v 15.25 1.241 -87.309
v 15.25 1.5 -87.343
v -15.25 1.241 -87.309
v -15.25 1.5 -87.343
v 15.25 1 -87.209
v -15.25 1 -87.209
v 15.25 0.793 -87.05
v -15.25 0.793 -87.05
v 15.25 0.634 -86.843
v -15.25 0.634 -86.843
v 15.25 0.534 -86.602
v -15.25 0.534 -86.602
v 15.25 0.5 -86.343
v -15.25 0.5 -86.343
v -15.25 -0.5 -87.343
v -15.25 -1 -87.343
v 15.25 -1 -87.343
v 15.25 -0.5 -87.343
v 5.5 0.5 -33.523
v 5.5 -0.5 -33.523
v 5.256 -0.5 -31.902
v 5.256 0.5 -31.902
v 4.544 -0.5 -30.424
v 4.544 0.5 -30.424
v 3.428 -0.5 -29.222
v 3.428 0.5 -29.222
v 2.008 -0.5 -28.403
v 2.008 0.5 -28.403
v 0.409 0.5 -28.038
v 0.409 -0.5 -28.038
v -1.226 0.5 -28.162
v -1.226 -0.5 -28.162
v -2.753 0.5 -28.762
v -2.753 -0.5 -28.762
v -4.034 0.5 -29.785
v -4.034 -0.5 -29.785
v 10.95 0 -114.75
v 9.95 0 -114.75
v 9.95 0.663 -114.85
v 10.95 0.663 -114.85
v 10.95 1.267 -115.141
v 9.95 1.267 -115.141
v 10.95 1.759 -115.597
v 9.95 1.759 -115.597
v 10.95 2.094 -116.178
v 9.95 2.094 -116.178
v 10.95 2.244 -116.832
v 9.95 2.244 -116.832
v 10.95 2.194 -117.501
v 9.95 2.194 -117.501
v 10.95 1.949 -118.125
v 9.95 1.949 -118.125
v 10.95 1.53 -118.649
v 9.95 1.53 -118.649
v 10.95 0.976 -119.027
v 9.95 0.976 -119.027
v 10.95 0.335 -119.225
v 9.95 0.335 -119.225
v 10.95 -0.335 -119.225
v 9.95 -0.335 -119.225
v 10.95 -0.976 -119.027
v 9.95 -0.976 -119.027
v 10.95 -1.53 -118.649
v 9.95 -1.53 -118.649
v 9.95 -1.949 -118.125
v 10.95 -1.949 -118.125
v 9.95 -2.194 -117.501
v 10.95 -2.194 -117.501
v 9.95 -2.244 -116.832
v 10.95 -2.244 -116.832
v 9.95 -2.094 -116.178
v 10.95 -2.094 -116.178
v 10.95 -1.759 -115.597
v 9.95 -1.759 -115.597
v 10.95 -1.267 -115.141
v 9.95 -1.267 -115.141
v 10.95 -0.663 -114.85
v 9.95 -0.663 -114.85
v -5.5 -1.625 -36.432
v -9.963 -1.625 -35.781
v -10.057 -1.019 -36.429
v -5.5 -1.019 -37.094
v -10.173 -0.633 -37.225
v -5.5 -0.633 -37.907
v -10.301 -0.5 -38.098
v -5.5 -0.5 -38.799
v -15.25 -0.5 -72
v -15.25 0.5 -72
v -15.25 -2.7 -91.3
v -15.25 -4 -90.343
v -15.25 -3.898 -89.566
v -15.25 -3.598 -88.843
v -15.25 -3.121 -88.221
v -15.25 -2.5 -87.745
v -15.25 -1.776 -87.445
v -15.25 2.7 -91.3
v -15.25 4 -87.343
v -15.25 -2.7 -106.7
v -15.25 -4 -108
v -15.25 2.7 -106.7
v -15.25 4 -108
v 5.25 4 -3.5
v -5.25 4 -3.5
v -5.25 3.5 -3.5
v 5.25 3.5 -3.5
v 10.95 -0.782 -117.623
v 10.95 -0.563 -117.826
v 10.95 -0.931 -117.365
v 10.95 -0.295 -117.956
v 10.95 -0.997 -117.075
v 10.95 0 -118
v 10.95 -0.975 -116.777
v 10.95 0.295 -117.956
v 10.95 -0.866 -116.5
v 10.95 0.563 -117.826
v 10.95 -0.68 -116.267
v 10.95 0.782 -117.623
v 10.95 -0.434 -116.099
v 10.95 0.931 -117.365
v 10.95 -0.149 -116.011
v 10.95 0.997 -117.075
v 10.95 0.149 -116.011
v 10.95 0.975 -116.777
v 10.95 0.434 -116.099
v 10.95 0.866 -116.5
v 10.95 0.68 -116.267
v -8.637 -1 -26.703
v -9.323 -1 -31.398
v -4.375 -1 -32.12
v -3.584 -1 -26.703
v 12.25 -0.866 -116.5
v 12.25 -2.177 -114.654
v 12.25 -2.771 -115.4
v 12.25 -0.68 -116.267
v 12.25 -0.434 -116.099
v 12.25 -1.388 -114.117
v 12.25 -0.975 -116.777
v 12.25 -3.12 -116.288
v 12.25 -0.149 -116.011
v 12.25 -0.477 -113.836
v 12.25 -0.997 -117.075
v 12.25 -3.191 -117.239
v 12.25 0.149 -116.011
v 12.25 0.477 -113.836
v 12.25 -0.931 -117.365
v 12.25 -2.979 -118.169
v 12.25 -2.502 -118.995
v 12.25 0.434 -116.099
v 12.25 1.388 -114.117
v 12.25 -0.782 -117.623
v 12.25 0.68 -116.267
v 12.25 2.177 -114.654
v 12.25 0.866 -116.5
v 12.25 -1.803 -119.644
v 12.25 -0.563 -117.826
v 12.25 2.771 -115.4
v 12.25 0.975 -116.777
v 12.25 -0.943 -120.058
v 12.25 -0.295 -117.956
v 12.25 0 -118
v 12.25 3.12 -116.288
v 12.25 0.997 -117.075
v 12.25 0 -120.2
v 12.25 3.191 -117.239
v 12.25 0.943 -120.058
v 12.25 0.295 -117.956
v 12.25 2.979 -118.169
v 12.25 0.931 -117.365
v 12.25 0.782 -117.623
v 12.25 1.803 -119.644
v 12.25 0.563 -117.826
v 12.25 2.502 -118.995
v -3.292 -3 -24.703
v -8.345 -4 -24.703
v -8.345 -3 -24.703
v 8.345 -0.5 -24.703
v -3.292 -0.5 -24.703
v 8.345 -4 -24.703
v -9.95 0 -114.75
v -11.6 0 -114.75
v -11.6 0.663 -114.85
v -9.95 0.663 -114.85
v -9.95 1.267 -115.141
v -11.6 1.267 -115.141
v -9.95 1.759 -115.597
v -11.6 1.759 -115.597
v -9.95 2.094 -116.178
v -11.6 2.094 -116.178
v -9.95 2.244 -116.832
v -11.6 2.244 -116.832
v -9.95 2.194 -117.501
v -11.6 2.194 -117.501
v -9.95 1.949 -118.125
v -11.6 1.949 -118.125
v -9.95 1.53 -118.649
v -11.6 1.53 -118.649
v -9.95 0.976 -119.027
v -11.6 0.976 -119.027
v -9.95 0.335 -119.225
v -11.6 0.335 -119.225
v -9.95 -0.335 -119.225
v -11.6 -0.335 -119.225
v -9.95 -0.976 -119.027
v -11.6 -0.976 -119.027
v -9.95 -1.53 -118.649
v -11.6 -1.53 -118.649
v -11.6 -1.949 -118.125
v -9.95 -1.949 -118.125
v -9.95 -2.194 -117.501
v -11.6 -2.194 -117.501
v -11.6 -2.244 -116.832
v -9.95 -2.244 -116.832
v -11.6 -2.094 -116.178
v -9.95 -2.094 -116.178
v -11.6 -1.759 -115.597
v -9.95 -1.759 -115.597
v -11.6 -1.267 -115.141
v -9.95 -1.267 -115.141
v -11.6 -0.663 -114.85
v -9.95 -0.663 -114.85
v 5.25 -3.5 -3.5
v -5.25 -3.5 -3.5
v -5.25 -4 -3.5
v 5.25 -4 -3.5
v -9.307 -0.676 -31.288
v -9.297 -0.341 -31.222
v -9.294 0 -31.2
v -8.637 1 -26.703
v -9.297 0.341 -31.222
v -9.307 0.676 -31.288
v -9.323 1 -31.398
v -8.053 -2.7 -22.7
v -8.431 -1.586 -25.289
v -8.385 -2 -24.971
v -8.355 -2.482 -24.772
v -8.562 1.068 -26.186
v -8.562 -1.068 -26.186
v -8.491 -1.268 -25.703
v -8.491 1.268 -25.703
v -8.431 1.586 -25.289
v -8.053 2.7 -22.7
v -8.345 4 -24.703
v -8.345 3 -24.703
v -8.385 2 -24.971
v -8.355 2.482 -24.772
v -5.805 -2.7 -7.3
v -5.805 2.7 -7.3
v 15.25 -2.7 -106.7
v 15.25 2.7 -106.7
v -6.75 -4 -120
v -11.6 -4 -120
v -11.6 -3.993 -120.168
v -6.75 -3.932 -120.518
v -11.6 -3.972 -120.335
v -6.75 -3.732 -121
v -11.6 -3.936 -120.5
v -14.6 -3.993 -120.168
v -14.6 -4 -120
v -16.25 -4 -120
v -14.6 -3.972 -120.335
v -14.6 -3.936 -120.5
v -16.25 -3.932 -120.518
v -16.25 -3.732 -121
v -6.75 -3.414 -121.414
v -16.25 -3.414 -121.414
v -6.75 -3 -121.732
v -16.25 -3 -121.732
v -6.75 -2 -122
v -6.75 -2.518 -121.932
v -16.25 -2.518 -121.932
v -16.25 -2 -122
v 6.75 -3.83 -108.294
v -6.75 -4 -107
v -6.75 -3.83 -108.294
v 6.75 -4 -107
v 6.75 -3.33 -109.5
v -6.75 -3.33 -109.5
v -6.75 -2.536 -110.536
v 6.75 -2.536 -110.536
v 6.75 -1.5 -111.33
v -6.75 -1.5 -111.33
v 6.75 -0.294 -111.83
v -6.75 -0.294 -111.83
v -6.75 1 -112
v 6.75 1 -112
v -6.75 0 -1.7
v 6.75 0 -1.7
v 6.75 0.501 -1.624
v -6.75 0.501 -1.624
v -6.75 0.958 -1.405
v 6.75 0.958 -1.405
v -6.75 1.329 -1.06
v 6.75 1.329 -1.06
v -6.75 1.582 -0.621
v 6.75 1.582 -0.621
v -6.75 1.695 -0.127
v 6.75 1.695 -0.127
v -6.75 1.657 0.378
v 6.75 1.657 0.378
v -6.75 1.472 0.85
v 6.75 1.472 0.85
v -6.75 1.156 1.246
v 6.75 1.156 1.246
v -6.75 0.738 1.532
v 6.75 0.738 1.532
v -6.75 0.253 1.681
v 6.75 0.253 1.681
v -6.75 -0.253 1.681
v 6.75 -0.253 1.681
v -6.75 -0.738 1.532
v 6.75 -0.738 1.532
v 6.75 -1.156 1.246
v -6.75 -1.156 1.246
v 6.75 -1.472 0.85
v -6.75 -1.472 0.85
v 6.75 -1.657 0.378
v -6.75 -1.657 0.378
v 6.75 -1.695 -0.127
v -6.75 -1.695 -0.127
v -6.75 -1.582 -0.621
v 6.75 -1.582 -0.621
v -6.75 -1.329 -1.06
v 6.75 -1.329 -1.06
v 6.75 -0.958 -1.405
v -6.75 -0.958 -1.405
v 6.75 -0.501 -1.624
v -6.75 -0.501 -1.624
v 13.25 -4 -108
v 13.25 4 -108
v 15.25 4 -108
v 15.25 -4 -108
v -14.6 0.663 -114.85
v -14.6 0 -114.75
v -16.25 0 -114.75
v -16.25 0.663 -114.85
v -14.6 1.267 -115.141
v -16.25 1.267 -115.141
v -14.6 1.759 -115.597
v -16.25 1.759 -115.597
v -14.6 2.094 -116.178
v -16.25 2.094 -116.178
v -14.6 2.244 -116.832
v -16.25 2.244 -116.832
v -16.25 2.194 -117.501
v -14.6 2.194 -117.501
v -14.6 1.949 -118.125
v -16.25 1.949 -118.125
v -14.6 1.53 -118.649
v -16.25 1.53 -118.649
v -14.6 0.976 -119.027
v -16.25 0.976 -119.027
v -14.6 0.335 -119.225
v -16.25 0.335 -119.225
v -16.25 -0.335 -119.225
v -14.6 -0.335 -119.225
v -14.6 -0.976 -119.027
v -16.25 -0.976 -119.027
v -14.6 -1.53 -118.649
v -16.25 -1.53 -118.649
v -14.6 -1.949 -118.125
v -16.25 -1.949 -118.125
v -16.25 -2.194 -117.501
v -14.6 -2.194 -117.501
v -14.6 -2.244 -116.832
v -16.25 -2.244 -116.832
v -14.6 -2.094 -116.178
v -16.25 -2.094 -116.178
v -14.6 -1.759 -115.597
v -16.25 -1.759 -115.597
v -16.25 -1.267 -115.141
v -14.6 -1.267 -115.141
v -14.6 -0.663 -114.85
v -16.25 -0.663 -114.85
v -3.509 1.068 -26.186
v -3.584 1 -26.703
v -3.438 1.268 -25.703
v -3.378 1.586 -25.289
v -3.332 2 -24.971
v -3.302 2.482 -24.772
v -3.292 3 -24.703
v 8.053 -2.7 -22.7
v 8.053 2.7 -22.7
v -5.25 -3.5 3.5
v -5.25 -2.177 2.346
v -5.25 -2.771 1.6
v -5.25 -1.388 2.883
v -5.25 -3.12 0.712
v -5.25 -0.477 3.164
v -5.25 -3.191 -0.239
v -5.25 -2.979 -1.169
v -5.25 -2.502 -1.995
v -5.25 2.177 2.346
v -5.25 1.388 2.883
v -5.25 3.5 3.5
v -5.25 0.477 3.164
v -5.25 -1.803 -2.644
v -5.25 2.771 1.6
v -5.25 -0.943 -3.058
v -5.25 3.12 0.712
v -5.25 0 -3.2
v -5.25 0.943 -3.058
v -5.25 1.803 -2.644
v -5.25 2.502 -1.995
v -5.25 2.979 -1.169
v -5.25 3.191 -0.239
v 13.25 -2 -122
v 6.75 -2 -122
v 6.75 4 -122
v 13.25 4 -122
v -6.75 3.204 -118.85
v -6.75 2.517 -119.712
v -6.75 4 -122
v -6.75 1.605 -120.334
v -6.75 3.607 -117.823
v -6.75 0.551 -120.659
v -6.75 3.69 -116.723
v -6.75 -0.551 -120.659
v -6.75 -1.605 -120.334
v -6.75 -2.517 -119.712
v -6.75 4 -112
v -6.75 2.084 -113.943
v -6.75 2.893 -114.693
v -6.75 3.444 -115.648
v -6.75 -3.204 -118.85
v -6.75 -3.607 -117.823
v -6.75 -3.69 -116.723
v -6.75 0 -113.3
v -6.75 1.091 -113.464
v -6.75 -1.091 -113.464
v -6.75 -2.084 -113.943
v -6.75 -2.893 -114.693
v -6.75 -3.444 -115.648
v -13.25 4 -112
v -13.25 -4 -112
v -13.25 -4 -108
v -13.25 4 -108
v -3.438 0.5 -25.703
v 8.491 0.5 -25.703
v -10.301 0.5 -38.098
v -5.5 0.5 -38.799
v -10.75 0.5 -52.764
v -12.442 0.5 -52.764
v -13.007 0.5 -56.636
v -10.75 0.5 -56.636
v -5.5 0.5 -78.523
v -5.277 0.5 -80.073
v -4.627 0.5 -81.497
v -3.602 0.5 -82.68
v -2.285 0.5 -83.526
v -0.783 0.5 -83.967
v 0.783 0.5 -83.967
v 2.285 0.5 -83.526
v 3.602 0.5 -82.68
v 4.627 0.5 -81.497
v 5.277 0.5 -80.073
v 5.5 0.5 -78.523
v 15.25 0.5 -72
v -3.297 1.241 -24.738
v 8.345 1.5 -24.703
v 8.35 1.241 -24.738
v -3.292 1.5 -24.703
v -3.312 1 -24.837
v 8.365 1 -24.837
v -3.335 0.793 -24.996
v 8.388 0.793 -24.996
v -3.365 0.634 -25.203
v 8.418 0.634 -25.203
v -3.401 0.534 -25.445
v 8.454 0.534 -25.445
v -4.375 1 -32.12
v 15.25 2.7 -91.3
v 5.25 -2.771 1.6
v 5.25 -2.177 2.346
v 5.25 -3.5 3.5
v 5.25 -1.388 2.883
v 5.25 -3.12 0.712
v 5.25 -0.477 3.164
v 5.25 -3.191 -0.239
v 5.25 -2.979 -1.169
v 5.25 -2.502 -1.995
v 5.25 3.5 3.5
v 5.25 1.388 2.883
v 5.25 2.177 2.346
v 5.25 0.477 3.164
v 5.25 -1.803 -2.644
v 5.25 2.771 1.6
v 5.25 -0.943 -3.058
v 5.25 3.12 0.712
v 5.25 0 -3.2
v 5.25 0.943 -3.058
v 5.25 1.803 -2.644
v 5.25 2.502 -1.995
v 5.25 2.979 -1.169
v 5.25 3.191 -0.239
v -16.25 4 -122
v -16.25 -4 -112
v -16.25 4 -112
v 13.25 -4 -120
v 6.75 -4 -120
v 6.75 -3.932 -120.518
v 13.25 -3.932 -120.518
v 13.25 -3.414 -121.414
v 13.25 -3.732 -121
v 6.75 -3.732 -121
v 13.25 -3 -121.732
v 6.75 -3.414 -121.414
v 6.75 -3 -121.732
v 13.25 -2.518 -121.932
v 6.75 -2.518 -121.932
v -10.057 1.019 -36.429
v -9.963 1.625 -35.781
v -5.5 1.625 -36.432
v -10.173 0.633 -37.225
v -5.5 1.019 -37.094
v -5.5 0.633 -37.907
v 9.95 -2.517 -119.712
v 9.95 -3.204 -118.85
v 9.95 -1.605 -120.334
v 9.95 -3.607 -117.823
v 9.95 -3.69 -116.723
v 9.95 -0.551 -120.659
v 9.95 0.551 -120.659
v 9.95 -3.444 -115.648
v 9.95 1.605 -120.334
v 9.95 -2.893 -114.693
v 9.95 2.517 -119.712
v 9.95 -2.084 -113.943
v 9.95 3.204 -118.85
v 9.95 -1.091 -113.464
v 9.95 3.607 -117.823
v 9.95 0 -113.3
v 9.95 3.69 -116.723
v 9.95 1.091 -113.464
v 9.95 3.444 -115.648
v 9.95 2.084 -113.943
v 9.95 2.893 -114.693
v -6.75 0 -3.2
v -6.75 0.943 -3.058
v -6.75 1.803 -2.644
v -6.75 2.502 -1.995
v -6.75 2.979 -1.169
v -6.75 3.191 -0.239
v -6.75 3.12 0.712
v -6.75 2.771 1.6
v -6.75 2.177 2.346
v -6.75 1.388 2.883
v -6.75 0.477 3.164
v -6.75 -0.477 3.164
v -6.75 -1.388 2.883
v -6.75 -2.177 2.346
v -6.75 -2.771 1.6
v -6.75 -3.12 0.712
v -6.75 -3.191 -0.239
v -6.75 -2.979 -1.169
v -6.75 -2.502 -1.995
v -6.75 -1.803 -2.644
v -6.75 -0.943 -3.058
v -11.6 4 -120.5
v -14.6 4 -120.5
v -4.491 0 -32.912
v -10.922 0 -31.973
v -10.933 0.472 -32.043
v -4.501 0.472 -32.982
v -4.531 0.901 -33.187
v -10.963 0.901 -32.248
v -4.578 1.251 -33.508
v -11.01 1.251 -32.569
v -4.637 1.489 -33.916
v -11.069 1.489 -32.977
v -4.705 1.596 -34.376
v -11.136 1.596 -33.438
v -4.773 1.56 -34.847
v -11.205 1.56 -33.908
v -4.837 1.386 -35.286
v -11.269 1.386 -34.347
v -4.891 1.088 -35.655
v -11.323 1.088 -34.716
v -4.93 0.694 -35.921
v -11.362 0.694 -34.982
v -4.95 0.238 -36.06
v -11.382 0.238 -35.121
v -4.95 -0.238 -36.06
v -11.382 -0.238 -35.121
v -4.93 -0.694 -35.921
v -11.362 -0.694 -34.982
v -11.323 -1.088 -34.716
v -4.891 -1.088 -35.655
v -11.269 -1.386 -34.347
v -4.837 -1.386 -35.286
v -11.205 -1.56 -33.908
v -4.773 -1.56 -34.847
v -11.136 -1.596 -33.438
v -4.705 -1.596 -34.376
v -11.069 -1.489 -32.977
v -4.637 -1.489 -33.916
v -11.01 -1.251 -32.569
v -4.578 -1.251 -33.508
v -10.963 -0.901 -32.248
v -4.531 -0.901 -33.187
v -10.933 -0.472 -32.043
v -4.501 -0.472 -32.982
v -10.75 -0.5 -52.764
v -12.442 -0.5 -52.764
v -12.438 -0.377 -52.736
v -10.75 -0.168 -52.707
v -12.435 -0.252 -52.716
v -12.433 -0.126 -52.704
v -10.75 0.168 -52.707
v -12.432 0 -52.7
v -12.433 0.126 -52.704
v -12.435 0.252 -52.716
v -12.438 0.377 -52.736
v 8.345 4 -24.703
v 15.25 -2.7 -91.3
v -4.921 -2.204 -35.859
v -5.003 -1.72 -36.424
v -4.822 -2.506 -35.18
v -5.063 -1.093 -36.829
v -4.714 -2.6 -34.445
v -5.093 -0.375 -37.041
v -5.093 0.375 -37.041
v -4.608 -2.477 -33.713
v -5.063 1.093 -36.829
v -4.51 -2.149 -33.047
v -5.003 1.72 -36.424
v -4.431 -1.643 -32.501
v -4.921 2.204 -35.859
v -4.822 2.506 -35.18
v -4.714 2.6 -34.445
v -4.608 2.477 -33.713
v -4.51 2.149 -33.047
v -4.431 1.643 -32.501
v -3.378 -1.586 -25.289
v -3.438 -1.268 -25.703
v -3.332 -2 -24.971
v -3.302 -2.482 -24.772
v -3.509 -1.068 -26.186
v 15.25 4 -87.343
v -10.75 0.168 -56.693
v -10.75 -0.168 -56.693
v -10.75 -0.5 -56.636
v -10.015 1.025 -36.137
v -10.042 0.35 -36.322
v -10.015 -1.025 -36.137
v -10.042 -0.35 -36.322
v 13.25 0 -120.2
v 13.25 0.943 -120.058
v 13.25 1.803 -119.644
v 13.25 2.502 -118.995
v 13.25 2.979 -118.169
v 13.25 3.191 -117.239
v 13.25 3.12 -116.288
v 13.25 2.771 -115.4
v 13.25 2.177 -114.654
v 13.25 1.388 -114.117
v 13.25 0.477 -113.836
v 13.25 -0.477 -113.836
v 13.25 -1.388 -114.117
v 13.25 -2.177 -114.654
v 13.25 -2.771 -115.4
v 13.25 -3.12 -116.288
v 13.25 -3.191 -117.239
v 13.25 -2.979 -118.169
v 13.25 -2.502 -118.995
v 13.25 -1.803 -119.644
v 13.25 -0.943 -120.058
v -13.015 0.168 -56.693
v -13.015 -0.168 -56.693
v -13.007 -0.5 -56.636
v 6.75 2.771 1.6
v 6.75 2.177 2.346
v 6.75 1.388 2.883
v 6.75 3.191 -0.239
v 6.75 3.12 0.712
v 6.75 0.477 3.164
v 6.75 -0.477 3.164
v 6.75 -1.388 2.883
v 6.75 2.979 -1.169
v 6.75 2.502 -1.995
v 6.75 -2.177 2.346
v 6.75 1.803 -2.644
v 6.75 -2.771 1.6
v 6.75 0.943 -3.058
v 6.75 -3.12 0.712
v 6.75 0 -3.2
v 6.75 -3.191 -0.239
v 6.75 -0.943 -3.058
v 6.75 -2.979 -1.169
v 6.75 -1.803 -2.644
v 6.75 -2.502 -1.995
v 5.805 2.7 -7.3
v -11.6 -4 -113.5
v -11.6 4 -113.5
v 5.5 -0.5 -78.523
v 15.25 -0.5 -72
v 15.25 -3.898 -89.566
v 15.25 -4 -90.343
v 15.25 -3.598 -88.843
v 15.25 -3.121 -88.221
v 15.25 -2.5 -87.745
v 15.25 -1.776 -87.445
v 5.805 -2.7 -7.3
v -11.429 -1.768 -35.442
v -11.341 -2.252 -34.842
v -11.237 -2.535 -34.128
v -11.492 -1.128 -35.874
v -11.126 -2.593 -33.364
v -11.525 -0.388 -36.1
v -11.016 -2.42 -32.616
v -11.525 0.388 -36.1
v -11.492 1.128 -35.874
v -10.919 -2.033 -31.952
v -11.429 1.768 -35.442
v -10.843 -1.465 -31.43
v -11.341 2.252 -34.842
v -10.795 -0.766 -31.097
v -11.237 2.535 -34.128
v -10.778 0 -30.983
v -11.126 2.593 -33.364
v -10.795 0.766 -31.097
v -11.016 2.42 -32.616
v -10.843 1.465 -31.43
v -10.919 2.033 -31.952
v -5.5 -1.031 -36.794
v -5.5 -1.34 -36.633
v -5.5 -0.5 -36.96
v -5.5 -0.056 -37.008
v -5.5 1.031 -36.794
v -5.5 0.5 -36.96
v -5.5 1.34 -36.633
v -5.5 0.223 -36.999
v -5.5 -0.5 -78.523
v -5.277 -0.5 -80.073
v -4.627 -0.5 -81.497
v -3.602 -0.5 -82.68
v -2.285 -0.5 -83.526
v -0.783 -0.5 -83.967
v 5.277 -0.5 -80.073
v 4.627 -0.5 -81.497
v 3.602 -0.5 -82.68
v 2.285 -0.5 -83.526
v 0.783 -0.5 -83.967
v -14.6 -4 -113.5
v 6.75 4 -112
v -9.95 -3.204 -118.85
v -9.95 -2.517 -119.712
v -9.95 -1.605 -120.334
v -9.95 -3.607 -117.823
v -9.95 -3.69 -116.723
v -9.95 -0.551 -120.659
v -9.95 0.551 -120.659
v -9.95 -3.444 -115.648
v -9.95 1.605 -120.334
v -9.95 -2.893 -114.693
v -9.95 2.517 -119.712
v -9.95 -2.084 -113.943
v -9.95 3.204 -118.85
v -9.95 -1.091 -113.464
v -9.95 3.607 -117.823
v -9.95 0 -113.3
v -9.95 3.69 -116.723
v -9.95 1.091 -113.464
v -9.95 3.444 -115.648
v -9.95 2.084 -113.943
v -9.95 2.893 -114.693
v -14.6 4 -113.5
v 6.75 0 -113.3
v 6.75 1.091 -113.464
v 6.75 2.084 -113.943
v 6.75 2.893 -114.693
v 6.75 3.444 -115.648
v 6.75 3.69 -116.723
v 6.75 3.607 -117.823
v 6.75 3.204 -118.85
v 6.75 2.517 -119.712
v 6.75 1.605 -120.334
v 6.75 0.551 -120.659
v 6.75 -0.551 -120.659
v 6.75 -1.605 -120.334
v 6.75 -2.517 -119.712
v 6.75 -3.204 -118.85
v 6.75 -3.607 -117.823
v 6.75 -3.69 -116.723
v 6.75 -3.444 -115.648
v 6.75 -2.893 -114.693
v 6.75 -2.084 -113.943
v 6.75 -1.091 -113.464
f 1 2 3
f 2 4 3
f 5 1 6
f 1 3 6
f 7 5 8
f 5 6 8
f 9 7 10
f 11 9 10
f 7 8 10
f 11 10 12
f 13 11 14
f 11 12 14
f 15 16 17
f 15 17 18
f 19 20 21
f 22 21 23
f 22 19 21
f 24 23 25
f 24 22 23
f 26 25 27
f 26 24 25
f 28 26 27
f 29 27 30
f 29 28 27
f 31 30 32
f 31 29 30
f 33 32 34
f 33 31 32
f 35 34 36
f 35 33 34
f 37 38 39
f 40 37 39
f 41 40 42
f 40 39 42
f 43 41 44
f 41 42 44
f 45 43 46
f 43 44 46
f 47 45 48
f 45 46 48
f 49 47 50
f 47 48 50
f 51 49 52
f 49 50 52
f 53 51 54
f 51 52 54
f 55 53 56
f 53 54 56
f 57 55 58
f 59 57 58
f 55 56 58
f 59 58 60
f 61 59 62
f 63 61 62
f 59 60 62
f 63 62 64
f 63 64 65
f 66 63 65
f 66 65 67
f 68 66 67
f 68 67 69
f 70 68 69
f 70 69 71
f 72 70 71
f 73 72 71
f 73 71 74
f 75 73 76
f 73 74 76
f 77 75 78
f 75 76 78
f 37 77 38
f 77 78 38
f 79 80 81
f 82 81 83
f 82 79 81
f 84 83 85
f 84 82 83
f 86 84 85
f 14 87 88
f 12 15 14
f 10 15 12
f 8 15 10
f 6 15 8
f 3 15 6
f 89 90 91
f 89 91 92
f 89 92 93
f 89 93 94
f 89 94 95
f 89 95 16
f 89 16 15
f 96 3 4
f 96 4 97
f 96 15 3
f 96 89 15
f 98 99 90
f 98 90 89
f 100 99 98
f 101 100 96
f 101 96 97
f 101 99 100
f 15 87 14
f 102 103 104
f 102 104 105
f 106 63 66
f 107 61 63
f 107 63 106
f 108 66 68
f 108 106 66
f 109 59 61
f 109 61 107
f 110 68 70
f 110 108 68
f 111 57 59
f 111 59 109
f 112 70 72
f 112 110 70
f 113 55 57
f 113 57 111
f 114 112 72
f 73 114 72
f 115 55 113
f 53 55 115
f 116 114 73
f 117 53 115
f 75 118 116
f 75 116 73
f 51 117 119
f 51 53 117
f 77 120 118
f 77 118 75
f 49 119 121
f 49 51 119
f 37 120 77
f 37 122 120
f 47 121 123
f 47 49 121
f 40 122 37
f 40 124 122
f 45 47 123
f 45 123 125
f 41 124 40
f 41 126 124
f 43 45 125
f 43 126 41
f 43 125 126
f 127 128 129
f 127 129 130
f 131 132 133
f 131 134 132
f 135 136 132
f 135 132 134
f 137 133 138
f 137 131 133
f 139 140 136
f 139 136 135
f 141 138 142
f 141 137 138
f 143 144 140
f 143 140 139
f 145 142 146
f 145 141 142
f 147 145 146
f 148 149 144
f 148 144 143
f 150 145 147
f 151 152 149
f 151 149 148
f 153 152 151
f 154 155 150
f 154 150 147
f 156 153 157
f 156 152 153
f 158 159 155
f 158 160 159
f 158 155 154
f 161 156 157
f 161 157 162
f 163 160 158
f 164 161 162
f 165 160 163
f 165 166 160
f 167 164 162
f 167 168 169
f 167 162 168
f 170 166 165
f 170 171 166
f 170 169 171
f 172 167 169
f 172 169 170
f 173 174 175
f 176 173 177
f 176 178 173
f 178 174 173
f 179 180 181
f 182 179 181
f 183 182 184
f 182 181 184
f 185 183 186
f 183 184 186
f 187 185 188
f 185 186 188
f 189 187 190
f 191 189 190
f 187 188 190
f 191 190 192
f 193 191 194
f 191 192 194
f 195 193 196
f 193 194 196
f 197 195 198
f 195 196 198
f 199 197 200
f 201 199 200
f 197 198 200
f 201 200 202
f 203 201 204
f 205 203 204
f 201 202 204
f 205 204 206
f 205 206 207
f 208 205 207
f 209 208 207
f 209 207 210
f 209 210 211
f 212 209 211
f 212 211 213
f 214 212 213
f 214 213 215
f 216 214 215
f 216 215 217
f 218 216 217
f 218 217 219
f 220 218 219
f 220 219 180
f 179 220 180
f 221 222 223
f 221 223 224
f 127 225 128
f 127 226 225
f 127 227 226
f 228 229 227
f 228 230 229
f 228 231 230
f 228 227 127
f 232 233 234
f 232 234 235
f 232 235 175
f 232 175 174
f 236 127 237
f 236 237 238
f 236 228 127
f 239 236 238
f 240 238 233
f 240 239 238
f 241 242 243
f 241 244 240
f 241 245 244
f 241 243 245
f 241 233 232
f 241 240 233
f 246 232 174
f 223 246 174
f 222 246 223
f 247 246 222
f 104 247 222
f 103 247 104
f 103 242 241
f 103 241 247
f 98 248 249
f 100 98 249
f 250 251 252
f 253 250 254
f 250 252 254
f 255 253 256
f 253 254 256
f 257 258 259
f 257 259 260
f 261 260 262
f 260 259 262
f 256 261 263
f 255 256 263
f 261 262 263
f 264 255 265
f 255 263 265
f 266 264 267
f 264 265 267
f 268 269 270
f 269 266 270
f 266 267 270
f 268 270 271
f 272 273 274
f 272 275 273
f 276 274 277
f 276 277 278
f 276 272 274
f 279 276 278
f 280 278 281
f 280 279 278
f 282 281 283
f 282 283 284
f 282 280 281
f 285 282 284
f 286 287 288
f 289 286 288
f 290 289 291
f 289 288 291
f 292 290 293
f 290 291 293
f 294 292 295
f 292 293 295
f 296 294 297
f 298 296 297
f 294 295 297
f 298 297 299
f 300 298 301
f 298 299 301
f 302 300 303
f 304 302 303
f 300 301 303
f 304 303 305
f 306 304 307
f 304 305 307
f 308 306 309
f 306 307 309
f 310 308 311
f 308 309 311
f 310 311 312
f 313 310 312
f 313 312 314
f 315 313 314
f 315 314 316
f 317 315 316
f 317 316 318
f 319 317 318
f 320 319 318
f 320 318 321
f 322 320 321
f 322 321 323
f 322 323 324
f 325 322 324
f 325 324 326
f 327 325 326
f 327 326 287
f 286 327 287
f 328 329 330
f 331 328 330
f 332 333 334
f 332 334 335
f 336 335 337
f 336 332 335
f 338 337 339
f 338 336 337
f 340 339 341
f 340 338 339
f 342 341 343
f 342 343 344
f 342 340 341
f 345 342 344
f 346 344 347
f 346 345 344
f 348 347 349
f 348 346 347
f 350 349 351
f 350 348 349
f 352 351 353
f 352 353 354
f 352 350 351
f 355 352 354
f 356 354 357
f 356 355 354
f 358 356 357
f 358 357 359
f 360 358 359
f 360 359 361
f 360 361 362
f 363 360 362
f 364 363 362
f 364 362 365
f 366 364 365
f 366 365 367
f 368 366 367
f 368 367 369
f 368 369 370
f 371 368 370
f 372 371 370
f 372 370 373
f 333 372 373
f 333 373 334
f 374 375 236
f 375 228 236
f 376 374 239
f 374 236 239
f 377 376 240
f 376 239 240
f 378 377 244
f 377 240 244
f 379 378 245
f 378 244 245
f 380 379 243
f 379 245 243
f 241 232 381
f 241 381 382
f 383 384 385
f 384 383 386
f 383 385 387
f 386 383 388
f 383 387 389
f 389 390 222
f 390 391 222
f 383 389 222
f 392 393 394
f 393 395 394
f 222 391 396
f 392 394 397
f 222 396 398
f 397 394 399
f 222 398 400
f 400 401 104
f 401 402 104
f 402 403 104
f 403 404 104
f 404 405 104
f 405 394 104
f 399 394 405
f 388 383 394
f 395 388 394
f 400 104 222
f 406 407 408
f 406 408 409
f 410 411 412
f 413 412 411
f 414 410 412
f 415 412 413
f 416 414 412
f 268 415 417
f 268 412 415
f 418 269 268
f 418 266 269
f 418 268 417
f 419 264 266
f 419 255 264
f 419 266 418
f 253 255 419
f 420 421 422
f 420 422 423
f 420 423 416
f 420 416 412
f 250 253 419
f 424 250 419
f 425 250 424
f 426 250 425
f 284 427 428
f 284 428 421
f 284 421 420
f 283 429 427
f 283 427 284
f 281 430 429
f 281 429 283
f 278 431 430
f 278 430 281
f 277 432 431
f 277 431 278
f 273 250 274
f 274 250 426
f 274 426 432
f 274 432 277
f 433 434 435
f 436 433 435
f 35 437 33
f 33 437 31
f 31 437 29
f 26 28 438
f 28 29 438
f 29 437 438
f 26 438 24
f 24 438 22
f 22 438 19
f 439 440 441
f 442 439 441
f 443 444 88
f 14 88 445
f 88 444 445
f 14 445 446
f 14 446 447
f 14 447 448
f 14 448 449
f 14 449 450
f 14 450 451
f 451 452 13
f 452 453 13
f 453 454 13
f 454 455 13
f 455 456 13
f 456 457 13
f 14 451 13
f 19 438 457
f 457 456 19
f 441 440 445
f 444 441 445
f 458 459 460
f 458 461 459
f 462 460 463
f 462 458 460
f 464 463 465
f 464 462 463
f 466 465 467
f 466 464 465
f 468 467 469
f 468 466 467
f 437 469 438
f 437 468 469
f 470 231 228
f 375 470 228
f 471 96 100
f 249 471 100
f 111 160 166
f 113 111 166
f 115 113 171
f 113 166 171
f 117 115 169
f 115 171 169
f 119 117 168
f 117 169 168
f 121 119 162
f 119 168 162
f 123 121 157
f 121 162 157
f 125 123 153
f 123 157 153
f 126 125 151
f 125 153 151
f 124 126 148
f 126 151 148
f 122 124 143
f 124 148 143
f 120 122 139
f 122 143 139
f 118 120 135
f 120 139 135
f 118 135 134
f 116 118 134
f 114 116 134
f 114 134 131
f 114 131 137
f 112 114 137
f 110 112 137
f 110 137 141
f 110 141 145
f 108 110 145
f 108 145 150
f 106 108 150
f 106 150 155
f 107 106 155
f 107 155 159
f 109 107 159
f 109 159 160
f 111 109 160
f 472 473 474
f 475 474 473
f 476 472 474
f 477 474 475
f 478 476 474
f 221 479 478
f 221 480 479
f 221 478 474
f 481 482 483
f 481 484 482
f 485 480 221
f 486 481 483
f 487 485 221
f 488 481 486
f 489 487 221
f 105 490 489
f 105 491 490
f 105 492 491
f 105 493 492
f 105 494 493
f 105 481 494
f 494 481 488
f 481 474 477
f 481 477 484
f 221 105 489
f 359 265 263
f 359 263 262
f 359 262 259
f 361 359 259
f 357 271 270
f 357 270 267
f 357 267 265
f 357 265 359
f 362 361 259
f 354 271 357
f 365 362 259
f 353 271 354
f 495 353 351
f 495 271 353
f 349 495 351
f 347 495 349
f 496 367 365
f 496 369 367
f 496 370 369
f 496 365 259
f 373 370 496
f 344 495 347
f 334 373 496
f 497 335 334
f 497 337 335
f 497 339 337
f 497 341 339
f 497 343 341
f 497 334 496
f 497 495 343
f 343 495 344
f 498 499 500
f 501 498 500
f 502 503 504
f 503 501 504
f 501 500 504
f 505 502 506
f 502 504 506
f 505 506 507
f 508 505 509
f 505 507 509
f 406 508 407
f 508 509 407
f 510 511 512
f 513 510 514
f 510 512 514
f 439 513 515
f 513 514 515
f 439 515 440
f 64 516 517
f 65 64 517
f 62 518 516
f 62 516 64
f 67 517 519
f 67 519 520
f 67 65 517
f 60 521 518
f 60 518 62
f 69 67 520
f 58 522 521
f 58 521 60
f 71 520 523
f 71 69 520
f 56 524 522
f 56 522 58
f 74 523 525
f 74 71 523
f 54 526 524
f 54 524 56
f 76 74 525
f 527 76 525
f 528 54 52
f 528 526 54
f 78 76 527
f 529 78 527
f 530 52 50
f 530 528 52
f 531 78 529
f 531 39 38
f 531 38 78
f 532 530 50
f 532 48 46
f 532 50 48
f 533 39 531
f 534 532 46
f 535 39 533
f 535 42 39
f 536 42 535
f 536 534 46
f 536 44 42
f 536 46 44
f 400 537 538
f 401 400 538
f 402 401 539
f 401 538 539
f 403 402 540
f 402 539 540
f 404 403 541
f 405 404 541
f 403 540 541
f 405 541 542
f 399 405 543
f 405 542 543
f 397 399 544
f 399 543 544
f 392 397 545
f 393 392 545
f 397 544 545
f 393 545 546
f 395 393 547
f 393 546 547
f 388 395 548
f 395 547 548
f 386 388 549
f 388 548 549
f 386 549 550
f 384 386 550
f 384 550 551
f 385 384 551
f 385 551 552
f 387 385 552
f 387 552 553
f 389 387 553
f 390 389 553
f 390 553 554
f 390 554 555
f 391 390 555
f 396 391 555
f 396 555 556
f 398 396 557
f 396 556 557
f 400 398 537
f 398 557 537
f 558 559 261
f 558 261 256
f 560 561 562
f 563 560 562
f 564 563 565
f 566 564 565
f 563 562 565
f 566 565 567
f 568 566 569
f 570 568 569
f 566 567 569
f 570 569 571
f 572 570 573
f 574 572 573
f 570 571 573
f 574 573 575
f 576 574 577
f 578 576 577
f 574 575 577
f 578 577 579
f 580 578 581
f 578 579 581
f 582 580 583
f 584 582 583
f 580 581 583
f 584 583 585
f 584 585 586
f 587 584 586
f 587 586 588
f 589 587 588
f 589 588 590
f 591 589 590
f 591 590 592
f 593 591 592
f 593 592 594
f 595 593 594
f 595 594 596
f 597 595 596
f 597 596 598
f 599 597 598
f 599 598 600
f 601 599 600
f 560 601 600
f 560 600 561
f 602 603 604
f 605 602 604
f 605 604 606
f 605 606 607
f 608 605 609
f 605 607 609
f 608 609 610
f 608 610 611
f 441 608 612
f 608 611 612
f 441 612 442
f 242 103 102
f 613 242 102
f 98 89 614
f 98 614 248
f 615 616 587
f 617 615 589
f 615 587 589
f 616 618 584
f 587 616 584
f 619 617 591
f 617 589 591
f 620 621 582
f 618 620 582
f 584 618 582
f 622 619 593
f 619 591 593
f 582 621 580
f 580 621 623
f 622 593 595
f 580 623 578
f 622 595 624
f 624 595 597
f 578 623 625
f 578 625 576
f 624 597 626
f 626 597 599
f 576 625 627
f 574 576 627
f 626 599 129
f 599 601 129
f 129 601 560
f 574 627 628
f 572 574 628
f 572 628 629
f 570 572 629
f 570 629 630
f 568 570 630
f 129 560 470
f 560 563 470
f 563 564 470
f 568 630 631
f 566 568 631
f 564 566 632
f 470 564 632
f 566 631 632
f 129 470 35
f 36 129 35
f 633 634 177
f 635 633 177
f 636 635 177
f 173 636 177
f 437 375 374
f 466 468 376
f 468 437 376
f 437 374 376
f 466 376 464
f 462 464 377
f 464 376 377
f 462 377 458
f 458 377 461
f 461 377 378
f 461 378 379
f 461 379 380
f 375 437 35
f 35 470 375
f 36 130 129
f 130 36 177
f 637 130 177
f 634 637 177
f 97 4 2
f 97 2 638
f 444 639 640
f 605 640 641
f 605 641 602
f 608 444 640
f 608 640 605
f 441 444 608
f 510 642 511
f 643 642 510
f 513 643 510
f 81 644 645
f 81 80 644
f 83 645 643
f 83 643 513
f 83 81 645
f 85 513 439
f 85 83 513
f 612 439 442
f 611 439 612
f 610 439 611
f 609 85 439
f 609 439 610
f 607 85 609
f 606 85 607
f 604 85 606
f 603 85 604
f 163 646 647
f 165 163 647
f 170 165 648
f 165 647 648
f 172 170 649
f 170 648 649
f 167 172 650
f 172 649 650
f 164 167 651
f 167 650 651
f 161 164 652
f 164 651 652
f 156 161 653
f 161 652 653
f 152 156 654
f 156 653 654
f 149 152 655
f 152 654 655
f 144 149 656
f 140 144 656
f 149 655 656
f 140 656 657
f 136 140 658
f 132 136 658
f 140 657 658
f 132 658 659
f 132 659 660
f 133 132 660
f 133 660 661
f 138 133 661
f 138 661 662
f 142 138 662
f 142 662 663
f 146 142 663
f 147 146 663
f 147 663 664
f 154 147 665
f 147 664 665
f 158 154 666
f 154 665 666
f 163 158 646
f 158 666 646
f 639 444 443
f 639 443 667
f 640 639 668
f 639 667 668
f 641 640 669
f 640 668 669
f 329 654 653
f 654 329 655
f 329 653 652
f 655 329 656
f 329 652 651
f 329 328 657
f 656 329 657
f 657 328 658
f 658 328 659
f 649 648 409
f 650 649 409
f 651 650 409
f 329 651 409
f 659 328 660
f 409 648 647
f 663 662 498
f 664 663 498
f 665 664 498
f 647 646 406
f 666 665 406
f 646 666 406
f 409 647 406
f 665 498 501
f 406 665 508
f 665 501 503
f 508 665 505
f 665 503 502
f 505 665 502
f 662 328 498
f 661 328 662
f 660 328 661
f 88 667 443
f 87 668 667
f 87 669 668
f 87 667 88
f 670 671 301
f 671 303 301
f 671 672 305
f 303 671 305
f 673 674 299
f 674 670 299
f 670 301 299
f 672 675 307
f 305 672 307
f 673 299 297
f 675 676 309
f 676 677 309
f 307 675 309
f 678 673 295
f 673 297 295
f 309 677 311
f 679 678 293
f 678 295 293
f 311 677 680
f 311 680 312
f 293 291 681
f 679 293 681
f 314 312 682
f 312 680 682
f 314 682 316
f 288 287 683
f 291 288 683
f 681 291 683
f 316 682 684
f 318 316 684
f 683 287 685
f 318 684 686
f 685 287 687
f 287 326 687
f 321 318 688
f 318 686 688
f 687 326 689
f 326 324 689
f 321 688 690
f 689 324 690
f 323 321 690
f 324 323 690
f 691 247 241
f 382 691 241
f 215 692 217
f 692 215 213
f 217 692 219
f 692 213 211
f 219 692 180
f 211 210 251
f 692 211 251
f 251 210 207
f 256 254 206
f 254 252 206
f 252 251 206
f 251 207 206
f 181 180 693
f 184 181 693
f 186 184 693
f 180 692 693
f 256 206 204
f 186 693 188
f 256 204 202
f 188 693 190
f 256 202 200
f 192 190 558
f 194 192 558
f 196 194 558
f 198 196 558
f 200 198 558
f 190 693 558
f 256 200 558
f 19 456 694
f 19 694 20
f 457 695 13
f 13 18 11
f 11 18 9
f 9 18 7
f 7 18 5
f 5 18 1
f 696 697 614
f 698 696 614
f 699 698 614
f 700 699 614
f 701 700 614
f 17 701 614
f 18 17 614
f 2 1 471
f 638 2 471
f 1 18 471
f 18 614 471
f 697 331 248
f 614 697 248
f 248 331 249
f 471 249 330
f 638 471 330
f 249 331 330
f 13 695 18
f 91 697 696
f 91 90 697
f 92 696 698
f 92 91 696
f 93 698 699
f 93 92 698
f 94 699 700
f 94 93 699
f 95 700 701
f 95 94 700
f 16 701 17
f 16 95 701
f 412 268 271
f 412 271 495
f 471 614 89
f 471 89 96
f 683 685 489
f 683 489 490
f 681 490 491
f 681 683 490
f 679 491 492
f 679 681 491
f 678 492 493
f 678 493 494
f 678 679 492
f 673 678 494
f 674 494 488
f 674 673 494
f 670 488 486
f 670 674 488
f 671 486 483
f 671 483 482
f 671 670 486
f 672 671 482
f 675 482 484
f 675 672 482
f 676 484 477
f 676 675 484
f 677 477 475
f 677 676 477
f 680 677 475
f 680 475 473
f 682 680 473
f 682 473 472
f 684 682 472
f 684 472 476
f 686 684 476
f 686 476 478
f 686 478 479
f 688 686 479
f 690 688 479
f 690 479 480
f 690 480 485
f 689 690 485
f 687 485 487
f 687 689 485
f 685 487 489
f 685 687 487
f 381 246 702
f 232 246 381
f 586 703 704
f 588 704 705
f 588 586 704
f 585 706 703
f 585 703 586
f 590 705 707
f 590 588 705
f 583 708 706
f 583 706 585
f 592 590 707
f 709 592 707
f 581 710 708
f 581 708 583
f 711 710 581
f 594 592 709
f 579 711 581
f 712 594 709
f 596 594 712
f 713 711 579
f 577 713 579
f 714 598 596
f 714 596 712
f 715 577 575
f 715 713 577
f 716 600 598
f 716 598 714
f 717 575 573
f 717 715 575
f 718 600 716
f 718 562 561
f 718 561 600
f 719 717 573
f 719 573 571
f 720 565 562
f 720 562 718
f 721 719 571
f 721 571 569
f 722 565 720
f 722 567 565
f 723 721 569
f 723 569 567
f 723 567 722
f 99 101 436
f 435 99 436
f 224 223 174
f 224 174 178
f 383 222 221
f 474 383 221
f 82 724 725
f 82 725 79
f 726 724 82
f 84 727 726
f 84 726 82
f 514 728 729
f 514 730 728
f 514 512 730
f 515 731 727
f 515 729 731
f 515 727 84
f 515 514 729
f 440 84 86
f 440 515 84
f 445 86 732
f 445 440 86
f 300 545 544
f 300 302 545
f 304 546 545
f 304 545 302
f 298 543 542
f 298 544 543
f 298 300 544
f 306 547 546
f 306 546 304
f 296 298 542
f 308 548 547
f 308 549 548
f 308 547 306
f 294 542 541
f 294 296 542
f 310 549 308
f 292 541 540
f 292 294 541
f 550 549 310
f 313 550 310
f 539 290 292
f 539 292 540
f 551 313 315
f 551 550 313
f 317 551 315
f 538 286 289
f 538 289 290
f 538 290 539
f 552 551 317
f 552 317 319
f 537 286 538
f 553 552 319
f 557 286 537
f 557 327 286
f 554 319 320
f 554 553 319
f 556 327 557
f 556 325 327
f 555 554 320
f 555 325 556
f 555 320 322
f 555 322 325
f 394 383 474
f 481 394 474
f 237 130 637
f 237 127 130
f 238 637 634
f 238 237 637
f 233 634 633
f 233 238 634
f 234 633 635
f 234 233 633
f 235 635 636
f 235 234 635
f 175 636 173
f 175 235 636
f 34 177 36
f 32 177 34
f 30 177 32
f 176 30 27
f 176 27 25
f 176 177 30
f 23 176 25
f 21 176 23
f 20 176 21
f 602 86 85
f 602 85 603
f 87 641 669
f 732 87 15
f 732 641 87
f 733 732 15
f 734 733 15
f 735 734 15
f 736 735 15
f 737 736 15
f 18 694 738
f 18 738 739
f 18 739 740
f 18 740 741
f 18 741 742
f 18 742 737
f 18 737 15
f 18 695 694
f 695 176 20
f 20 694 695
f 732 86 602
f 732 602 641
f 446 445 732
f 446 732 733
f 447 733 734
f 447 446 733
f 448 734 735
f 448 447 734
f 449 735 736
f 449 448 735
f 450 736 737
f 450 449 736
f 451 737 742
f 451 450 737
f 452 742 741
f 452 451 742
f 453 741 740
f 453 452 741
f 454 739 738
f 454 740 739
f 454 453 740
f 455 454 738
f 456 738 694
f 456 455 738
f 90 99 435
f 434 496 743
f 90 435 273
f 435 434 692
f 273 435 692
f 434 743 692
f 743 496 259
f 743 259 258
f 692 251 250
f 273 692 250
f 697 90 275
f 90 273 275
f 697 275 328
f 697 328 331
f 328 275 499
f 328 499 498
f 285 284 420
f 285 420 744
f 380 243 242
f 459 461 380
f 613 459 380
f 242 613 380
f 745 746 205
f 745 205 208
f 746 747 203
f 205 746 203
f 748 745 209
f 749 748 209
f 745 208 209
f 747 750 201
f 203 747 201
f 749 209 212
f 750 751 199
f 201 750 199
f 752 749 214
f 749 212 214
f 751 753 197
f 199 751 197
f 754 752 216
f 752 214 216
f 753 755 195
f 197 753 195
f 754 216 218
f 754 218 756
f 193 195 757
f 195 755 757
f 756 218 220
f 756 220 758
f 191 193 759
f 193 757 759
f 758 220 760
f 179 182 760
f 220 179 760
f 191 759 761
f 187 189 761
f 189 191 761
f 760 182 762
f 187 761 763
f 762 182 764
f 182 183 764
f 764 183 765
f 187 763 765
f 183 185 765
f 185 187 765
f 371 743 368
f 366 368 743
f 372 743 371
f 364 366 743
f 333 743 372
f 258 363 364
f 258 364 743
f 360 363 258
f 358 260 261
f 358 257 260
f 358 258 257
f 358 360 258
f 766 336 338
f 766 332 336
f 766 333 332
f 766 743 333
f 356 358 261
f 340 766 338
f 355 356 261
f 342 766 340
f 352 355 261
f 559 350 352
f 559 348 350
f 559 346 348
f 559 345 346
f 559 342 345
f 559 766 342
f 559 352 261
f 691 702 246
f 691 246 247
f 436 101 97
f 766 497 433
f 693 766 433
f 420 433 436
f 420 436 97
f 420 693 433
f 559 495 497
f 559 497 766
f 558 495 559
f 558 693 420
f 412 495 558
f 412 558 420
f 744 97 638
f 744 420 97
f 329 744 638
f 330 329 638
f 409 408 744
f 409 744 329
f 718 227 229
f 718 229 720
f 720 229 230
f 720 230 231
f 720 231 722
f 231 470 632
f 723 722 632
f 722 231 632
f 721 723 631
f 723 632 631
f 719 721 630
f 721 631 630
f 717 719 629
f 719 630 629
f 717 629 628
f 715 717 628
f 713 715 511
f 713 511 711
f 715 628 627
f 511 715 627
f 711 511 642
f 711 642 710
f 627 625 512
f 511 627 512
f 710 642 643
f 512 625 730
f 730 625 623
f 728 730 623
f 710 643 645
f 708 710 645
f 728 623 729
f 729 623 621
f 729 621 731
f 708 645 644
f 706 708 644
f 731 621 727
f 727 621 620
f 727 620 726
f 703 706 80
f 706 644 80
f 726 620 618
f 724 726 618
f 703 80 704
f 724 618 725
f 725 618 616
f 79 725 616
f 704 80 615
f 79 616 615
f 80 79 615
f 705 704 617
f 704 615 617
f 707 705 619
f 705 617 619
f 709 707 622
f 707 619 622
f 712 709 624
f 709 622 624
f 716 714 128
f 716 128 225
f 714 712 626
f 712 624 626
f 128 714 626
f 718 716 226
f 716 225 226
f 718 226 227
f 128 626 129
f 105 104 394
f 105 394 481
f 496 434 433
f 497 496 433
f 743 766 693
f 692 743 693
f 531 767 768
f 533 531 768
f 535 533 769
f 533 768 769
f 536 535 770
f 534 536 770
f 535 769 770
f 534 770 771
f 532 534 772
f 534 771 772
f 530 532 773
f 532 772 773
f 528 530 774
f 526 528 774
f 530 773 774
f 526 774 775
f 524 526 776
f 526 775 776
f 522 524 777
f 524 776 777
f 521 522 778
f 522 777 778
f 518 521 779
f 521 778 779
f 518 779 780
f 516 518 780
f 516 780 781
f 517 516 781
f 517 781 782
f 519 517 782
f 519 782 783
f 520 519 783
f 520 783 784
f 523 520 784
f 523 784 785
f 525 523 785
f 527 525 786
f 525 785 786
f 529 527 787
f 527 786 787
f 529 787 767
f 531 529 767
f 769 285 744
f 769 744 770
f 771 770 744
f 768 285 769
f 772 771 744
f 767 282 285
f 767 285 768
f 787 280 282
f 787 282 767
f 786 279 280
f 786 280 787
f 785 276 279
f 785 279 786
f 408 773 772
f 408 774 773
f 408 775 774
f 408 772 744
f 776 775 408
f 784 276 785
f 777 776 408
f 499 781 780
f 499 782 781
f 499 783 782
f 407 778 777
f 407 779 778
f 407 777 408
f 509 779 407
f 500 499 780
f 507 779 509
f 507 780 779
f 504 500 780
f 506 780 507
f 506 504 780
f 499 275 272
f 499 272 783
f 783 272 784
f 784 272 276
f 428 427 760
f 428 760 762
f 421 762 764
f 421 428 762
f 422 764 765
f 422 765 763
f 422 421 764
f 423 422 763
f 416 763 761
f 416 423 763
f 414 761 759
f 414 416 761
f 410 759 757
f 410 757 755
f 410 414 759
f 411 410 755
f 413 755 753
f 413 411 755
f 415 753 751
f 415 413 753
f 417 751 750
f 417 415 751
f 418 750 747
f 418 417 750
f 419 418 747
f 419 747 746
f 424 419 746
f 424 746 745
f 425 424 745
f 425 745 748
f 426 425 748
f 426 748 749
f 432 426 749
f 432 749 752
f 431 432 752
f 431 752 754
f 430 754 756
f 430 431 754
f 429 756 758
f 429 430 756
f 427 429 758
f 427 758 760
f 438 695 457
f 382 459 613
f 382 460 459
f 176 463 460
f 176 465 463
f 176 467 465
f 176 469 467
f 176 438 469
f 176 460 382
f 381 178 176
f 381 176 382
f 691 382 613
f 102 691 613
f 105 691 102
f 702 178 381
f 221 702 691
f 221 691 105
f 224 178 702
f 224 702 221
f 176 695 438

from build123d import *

# Parameters (mm, degrees)
JOINTTIBIA_DEPTH           = 3.5
JOINTTIBIA_DEPTH_BACK      = 3.5
ESQUISSE2_W                = 13.5
ESQUISSE2_H                = 7
ESQUISSE3_R                = 1.7
HOLEAXETIBIA_DEPTH         = 14.5
ESQUISSE4_R                = 5.505678288
ESQUISSE4_R_2              = 3.2
ENTRETOISETIBIA_DEPTH      = 1.5
SHAPEJOINTCOXA_DEPTH       = 4
SHAPEJOINTCOXA_DEPTH_BACK  = 4
ESQUISSE6_R                = 3.2
HOLEMAGNET_DEPTH           = 1
ESQUISSE7_R                = 2.25
HOLEAXE_DEPTH              = 8
ESQUISSE9_R                = 3.7
HOLEBEARING_DEPTH          = 3.2
ESQUISSE10_R               = 2.25
ENTRETOISEBEARING_DEPTH    = 1
ESQUISSE12_W               = 10
ESQUISSE12_H               = 8
ESQUISSE12_R               = 2.25
EXTSCREWLESS_DEPTH         = 3
ESQUISSE13_W               = 3
ESQUISSE13_H               = 7
SCEWLESSLOCKER_DEPTH       = 10
ESQUISSE24_W               = 30.5
ESQUISSE24_H               = 8
SHAPE_BDY_DEPTH            = 104.5
TRIANGULIZE_DEPTH          = 10
ESQUISSE27_W               = 15.4
ESQUISSE27_H               = 5.4
ATTACHWINGS_DEPTH          = 10
ESQUISSE29_W               = 62.63923601
ESQUISSE29_H               = 9.700813627
VOID_BODY_DEPTH            = 38
MASS_REMOVER_PCB_DEPTH     = 10
CONG_1_R                   = 5
CONG_2_R                   = 3
ESQUISSE32_W               = 15.4
ESQUISSE32_H               = 5.4
LOCKERHOLE_DEPTH           = 32
FIXATIONSENSOR_DEPTH       = 1.5
FIXATIONSENSOR_DEPTH_BACK  = 5
ESQUISSE33_R               = 2.6
ESQUISSE34_R               = 1.6
SCREWFIXATIONSENSOR_DEPTH  = 10
ESQUISSE35_W               = 8
ESQUISSE35_H               = 2
FIXATIONSENSORRENFOR_DEPTH = 5
CONG_3_R                   = 3
CONG_4_R                   = 2
CONG_5_R                   = 2
CONG_6_R                   = 1
ESQUISSE36_R               = 2
ENL_V_MAT_EXTRU_1_DEPTH    = 4.5
ESQUISSE38_R               = 1
REMOVER_HELPER_DEPTH       = 10


with BuildPart() as part:
    # Esquisse2 → JointTibia (new, two sides: drawn at the far end of the back side and taken through both)
    with BuildSketch(Plane(origin=(0, 0, 0), x_dir=(1, 0, 0), z_dir=(0, 1, 0)).offset(-JOINTTIBIA_DEPTH_BACK)):
        Rectangle(ESQUISSE2_W, ESQUISSE2_H)
    extrude(amount=JOINTTIBIA_DEPTH + JOINTTIBIA_DEPTH_BACK)

    # Esquisse3 → HoleAxeTibia (cut)
    with BuildSketch(Plane(origin=(6.75, 0, 0), x_dir=(0, 0, -1), z_dir=(1, 0, 0))):
        Circle(ESQUISSE3_R)
    extrude(amount=-HOLEAXETIBIA_DEPTH, mode=Mode.SUBTRACT)

    # Esquisse4 → EntretoiseTibia (cut)
    with BuildSketch(Plane(origin=(6.75, 0, 0), x_dir=(0, 0, -1), z_dir=(1, 0, 0))):
        Circle(ESQUISSE4_R)
        Circle(ESQUISSE4_R_2, mode=Mode.SUBTRACT)
    entretoisetibia = extrude(amount=-ENTRETOISETIBIA_DEPTH, mode=Mode.SUBTRACT)

    # Symétrie1: EntretoiseTibia across plane
    add(entretoisetibia.mirror(Plane(origin=(0, 0, 0), x_dir=(0, 0, 1), z_dir=(1, 0, 0))), mode=Mode.SUBTRACT)



with BuildPart() as body_2:
    # Esquisse5 → ShapeJointCoxa (new, two sides: drawn at the far end of the back side and taken through both)
    with BuildSketch(Plane(origin=(0, 0, 0), x_dir=(1, 0, 0), z_dir=(0, 1, 0)).offset(-SHAPEJOINTCOXA_DEPTH_BACK)):
        Polygon((-13.25, 112), (-13.25, 122), (-6.75, 122), (-6.75, 112), (6.75, 112), (6.75, 122), (13.25, 122), (13.25, 112), (13.25, 108), (-13.25, 108), align=None)
    extrude(amount=SHAPEJOINTCOXA_DEPTH + SHAPEJOINTCOXA_DEPTH_BACK)

    # Esquisse6 → HoleMagnet (cut)
    with BuildSketch(Plane(origin=(13.25, 0, 0), x_dir=(0, 0, -1), z_dir=(1, 0, 0))):
        with Locations((117, 0)):
            Circle(ESQUISSE6_R)
    extrude(amount=-HOLEMAGNET_DEPTH, mode=Mode.SUBTRACT)

    # Esquisse7 → HoleAxe (cut)
    with BuildSketch(Plane.ZY.offset(13.25)):
        with Locations((-117, 0)):
            Circle(ESQUISSE7_R)
    extrude(amount=-HOLEAXE_DEPTH, mode=Mode.SUBTRACT)

    # Esquisse9 → HoleBearing (cut)
    with BuildSketch(Plane.ZY.offset(-6.75)):
        with Locations((-117, 0)):
            Circle(ESQUISSE9_R)
    holebearing = extrude(amount=-HOLEBEARING_DEPTH, mode=Mode.SUBTRACT)

    # Symétrie2: HoleBearing across plane
    add(holebearing.mirror(Plane(origin=(0, 0, 0), x_dir=(0, 0, 1), z_dir=(1, 0, 0))), mode=Mode.SUBTRACT)

    # Esquisse10 → EntretoiseBearing (cut)
    with BuildSketch(Plane.ZY.offset(-9.95)):
        with Locations((-117, 0)):
            Circle(ESQUISSE10_R)
    extrude(amount=-ENTRETOISEBEARING_DEPTH, mode=Mode.SUBTRACT)

    # Esquisse12 → ExtScrewLess (add)
    with BuildSketch(Plane.ZY.offset(13.25)):
        with Locations((-117, 0)):
            Rectangle(ESQUISSE12_W, ESQUISSE12_H)
        with Locations((-117, 0)):
            Circle(ESQUISSE12_R, mode=Mode.SUBTRACT)
    extrude(amount=EXTSCREWLESS_DEPTH)

    # Esquisse13 → ScewLessLocker (cut)
    with BuildSketch(Plane(origin=(0, 4, 0), x_dir=(1, 0, 0), z_dir=(0, 1, 0))):
        with Locations((-13.1, 117)):
            Rectangle(ESQUISSE13_W, ESQUISSE13_H)
    extrude(amount=-SCEWLESSLOCKER_DEPTH, mode=Mode.SUBTRACT)


with BuildPart() as part_1:
    add(part.part)

    add(body_2.part)  # Shape_bdy merges body 2
    # Esquisse24 → Shape_bdy (add)
    with BuildSketch(Plane.XY.offset(-108)):
        Rectangle(ESQUISSE24_W, ESQUISSE24_H)
    extrude(amount=SHAPE_BDY_DEPTH)

    # Esquisse26 → Triangulize (cut)
    with BuildSketch(Plane.XZ.offset(4)):
        Polygon((-5.25, -3.5), (-15.25, -72), (-15.25, -3.5), align=None)
        Polygon((5.25, -3.5), (15.25, -3.5), (15.25, -72), align=None)
    extrude(amount=-TRIANGULIZE_DEPTH, mode=Mode.SUBTRACT)

    # Esquisse27 → AttachWings (cut)
    with BuildSketch(Plane(origin=(15.25, 0, 0), x_dir=(0, 0, -1), z_dir=(1, 0, 0))):
        with Locations((99, 0)):
            Rectangle(ESQUISSE27_W, ESQUISSE27_H)
        with Locations((15, 0)):
            Rectangle(ESQUISSE27_W, ESQUISSE27_H)
    attachwings = extrude(amount=-ATTACHWINGS_DEPTH, mode=Mode.SUBTRACT)

    # Symétrie4: AttachWings across plane
    add(attachwings.mirror(Plane(origin=(0, 0, 0), x_dir=(0, 0, 1), z_dir=(1, 0, 0))), mode=Mode.SUBTRACT)

    # Esquisse29 → Void body (cut)
    with BuildSketch(Plane(origin=(15.25, 0, 0), x_dir=(0, 0, -1), z_dir=(1, 0, 0))):
        with Locations((56.023105982, 5.350406814)):
            Rectangle(ESQUISSE29_W, ESQUISSE29_H)
        with Locations((56.023105982, -5.350406814)):
            Rectangle(ESQUISSE29_W, ESQUISSE29_H)
    extrude(amount=-VOID_BODY_DEPTH, mode=Mode.SUBTRACT)

    # Esquisse30 → Mass remover & PCB (cut)
    with BuildSketch(Plane(origin=(0, 0.5, 0), x_dir=(1, 0, 0), z_dir=(0, 1, 0))):
        with BuildLine():
            Line((5.5, 78.523105982), (5.5, 33.523105982))
            ThreePointArc((5.5, 33.523105982), (0, 28.023105982), (-5.5, 33.523105982))
            Line((-5.5, 33.523105982), (-5.5, 78.523105982))
            ThreePointArc((-5.5, 78.523105982), (0, 84.023105982), (5.5, 78.523105982))
        make_face()
    extrude(amount=-MASS_REMOVER_PCB_DEPTH, mode=Mode.SUBTRACT)

    # Congé1
    cong_1_edges = [part_1.edges().sort_by_distance(p)[0] for p in [
        (0, -4, -112),
    ]]
    fillet(cong_1_edges, radius=CONG_1_R)

    # Congé2
    cong_2_edges = [part_1.edges().sort_by_distance(p)[0] for p in [
        (0, -4, -87.342723987),
    ]]
    fillet(cong_2_edges, radius=CONG_2_R)

    # Esquisse32 → LockerHole (cut)
    with BuildSketch(Plane(origin=(5.25, 0, 0), x_dir=(0, 0, -1), z_dir=(1, 0, 0))):
        with Locations((99, 0)):
            Rectangle(ESQUISSE32_W, ESQUISSE32_H)
        with Locations((15, 0)):
            Rectangle(ESQUISSE32_W, ESQUISSE32_H)
    extrude(amount=-LOCKERHOLE_DEPTH, mode=Mode.SUBTRACT)

    # Esquisse33 → FixationSensor (add, two sides: drawn at the far end of the back side and taken through both)
    with BuildSketch(Plane(origin=(-4.640161198, 0, 0.677395795), x_dir=(0.14445423110427463, 0, 0.989511483064281), z_dir=(-0.989511483064281, 0, 0.14445423110427463)).offset(-FIXATIONSENSOR_DEPTH_BACK)):
        with Locations((-34.81506606, 0)):
            Circle(ESQUISSE33_R)
    extrude(amount=FIXATIONSENSOR_DEPTH + FIXATIONSENSOR_DEPTH_BACK)

    # Esquisse34 → ScrewFixationSensor (cut)
    with BuildSketch(Plane(origin=(-6.124428422, 0, 0.894077142), x_dir=(0.14445423110427466, 0, 0.989511483064281), z_dir=(-0.989511483064281, 0, 0.14445423110427466))):
        with Locations((-34.81506606, 0)):
            Circle(ESQUISSE34_R)
    extrude(amount=-SCREWFIXATIONSENSOR_DEPTH, mode=Mode.SUBTRACT)

    # Esquisse35 → FixationSensorRenfor (add)
    with BuildSketch(Plane(origin=(-4.640161198, 0, 0.677395795), x_dir=(0.14445423110427463, 0, 0.989511483064281), z_dir=(-0.989511483064281, 0, 0.14445423110427463))):
        with Locations((-28.41506606, 0)):
            Rectangle(ESQUISSE35_W, ESQUISSE35_H)
    extrude(amount=-FIXATIONSENSORRENFOR_DEPTH)

    # Congé3
    cong_3_edges = [part_1.edges().sort_by_distance(p)[0] for p in [
        (-7.768957729, 0.5, -36.628455586),
        (-7.768957729, -0.5, -36.628455586),
    ]]
    fillet(cong_3_edges, radius=CONG_3_R)

    # Congé4
    # the kernel refuses this fillet: 2 mm, written as the material it takes off along each edge
    with BuildSketch(Plane(origin=(1.75, -4, -122), x_dir=(0, 0, 1), z_dir=(1, 0, 0))) as cong_4_piece_1:
        with BuildLine():
            CenterArc((CONG_4_R, -CONG_4_R), CONG_4_R, 90, 90)
            Line((0, -CONG_4_R), (0, 0))
            Line((0, 0), (CONG_4_R, 0))
        make_face()
    extrude(amount=16.5, mode=Mode.SUBTRACT)
    with BuildSketch(Plane(origin=(-21.25, -4, -122), x_dir=(0, 0, 1), z_dir=(1, 0, 0))) as cong_4_piece_2:
        with BuildLine():
            CenterArc((CONG_4_R, -CONG_4_R), CONG_4_R, 90, 90)
            Line((0, -CONG_4_R), (0, 0))
            Line((0, 0), (CONG_4_R, 0))
        make_face()
    extrude(amount=19.5, mode=Mode.SUBTRACT)

    # Congé5
    cong_5_edges = [part_1.edges().sort_by_distance(p)[0] for p in [
        (-5.818900475, 1, -24.703487977),
        (-5.818900475, -1, -24.703487977),
    ]]
    fillet(cong_5_edges, radius=CONG_5_R)

    # Congé6
    cong_6_edges = [part_1.edges().sort_by_distance(p)[0] for p in [
        (0, 0.5, -87.342723987),
        (2.52649923, 0.5, -24.703487977),
    ]]
    fillet(cong_6_edges, radius=CONG_6_R)

    # Esquisse36 → Enlèv. mat.-Extru.1 (cut)
    with BuildSketch(Plane.ZY.offset(15.25)):
        with Locations((-54.7, 0)):
            Circle(ESQUISSE36_R)
    extrude(amount=-ENL_V_MAT_EXTRU_1_DEPTH, mode=Mode.SUBTRACT)

    # Esquisse38 → Remover helper (cut)
    with BuildSketch(Plane(origin=(12.25, 0, 0), x_dir=(0, 0, -1), z_dir=(1, 0, 0))):
        with Locations((117, 0)):
            Circle(ESQUISSE38_R)
    extrude(amount=-REMOVER_HELPER_DEPTH, mode=Mode.SUBTRACT)


solid = part_1.part
